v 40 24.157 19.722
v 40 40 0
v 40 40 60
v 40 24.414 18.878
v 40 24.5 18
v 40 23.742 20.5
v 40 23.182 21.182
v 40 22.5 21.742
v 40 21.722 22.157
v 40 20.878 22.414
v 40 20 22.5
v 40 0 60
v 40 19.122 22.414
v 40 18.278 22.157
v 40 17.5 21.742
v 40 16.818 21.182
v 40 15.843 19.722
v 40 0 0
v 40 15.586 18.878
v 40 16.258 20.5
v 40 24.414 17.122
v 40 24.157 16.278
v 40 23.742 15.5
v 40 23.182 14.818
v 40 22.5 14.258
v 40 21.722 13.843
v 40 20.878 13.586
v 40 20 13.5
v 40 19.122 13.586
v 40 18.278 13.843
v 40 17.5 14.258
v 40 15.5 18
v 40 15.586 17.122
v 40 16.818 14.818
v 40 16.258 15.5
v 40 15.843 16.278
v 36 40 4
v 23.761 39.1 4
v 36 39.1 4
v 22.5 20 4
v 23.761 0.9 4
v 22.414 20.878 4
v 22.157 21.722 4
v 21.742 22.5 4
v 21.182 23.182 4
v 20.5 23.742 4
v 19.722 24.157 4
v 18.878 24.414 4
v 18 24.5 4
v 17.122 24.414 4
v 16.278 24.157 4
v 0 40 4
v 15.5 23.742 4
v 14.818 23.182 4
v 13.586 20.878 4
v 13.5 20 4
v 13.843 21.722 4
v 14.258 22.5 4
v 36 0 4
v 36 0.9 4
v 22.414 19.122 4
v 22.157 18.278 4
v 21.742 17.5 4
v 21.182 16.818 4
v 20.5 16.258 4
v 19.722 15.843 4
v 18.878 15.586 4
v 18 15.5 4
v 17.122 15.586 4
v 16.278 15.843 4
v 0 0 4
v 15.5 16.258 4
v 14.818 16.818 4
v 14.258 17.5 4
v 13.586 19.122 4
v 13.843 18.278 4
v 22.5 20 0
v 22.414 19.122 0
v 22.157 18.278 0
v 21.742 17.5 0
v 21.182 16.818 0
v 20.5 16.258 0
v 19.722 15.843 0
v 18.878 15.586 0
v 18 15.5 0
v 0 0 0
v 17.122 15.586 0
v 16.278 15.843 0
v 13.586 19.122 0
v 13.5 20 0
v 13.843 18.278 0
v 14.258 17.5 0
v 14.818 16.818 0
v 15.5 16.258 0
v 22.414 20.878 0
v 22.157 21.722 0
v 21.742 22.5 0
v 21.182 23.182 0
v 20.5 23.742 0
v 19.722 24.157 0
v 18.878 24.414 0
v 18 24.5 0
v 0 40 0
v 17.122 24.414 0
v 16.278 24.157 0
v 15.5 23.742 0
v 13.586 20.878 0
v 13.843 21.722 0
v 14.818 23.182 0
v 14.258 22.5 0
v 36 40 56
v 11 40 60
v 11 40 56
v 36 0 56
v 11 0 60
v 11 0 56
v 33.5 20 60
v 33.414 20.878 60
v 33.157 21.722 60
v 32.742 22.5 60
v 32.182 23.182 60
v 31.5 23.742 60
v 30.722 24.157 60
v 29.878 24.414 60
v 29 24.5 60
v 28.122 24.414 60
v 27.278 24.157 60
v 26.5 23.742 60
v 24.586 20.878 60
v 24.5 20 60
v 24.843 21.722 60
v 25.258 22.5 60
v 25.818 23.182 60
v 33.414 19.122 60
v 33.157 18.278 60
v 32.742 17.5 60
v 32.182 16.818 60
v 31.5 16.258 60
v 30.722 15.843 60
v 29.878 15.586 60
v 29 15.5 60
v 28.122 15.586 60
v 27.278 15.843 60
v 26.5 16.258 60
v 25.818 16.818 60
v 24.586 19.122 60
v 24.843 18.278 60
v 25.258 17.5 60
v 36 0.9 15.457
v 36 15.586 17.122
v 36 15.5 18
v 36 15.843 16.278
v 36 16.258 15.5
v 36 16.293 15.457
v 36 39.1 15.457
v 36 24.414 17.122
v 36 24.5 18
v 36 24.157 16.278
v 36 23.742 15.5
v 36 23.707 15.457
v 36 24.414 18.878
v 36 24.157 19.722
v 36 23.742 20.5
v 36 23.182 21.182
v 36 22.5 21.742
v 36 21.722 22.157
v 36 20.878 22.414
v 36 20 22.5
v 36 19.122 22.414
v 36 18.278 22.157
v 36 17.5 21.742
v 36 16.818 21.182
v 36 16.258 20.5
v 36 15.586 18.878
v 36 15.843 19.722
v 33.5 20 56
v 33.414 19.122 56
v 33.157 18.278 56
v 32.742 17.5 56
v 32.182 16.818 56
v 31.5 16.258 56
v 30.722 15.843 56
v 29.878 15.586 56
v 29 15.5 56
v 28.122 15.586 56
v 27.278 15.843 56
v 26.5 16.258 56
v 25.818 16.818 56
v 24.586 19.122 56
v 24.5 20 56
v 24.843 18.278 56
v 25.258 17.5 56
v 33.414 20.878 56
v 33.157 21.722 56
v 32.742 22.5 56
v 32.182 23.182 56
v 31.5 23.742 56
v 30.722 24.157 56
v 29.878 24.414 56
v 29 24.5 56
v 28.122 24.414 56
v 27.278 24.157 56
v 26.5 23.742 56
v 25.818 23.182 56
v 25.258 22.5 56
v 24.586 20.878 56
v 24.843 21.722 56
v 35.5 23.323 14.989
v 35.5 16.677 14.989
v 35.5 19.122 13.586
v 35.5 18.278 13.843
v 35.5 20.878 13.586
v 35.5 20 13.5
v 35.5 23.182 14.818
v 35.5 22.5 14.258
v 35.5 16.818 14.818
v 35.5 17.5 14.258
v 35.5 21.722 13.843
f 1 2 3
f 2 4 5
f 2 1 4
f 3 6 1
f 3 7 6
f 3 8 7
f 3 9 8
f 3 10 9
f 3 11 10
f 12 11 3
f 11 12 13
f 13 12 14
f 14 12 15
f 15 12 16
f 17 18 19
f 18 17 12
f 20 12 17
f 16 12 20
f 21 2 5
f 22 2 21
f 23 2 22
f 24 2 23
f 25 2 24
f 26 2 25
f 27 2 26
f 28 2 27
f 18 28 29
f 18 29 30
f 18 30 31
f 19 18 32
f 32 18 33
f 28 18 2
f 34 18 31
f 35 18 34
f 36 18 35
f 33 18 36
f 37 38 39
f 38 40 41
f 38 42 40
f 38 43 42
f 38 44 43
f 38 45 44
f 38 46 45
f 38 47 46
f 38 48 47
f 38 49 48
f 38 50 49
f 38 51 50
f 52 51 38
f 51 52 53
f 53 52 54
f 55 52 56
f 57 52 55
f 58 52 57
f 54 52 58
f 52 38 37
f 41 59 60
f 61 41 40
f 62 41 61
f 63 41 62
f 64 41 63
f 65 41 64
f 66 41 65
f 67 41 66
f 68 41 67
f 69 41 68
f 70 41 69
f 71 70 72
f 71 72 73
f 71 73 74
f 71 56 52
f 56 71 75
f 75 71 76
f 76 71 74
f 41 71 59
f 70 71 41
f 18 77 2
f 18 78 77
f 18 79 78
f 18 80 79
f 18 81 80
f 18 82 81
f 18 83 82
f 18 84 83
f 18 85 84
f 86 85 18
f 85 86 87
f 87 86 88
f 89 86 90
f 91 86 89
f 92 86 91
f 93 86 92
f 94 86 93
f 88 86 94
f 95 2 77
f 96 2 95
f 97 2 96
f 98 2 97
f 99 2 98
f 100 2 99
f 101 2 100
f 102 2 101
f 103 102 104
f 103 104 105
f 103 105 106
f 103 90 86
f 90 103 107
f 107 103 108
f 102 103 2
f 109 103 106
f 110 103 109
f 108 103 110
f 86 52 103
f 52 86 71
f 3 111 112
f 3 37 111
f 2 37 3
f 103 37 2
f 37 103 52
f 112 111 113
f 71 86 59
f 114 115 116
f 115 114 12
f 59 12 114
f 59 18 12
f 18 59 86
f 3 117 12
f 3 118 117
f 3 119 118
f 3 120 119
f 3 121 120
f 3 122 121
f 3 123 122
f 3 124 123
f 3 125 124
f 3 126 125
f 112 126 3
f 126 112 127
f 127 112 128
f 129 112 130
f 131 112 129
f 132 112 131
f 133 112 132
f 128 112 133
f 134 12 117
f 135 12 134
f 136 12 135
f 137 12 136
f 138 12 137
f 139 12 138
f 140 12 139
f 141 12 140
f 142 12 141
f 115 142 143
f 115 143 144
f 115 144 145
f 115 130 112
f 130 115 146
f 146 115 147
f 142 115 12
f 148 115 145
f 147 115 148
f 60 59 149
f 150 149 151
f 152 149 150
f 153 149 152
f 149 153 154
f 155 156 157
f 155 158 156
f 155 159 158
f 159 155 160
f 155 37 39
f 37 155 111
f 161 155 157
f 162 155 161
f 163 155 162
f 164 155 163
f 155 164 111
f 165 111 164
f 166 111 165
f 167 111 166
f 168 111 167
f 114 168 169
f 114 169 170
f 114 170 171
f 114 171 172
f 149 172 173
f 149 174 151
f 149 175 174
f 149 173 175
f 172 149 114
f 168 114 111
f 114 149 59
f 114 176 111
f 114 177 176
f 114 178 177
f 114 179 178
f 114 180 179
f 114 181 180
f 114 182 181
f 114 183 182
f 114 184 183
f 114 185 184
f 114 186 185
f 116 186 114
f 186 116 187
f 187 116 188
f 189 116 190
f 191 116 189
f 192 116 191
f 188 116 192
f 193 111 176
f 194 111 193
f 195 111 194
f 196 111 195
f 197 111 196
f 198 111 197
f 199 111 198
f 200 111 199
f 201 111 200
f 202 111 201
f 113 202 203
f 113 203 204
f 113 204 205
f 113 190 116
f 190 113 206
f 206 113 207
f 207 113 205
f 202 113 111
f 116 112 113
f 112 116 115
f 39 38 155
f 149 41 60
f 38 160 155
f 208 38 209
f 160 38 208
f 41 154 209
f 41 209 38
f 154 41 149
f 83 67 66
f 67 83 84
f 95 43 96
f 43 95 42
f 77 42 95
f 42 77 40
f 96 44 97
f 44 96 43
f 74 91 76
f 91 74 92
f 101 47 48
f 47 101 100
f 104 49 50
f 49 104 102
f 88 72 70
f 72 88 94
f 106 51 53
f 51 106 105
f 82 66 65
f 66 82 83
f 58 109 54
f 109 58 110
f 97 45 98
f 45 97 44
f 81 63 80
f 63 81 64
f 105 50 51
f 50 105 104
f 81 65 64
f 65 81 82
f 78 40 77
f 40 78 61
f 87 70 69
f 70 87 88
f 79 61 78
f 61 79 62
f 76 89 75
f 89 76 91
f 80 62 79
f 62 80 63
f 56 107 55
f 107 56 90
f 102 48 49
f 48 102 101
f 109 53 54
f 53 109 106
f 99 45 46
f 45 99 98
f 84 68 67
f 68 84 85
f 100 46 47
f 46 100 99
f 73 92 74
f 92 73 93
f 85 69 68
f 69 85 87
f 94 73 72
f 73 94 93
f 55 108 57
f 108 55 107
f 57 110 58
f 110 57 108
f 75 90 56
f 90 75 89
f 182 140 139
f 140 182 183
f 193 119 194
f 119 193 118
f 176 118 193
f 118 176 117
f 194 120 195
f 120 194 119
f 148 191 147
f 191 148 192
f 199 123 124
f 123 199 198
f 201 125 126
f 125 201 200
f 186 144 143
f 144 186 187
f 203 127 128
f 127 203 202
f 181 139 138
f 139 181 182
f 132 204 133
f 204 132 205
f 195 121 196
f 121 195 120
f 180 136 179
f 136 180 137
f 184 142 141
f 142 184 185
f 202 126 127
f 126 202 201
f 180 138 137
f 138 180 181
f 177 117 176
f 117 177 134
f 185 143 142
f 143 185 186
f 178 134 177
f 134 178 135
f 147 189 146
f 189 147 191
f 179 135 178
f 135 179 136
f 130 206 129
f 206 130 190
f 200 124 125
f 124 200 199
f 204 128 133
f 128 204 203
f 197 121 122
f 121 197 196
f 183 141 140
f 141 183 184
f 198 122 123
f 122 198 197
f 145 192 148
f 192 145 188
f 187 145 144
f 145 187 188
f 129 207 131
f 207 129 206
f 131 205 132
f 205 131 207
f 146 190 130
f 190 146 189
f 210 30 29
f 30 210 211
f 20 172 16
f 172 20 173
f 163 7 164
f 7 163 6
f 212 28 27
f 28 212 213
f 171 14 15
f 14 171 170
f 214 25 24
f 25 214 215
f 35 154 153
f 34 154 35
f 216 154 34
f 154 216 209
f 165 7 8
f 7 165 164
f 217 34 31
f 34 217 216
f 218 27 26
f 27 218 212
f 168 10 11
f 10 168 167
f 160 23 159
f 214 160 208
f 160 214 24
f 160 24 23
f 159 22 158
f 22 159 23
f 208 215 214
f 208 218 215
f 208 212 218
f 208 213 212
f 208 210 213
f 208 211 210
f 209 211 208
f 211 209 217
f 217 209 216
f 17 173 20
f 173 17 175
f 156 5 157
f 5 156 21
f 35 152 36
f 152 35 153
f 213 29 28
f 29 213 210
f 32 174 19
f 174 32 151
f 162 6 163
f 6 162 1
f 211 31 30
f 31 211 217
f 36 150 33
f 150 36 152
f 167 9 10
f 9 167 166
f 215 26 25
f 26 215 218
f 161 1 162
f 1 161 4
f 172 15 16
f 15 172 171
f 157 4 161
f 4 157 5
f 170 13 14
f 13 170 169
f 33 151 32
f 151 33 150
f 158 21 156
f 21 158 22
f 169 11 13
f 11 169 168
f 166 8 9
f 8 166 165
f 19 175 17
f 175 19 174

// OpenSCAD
$fn = 32;

// ----------------------------------------------------------------------
// Z-bracket: 40 x 40 x 60 mm
// ----------------------------------------------------------------------

// --- parameters (mm) ---
lower_len = 40;           // lower foot length, X
upper_len = 25;           // upper foot length, X
width = 40;               // bracket width, Y
rise = 60;                // overall rise, Z
thick = 4;                // plate thickness
hole_d = 9;               // clearance for M8
rib_len = 13.2;           // gusset leg
rib_sink = 0.9;           // gusset overlap into the plates

module hole_z(px, py, z0) {
  translate([px, py, z0 - 0.5]) cylinder(h = thick + 1, d = hole_d);
}
module hole_x(py, pz) {
  translate([-0.5, py, pz]) rotate([0, 90, 0]) cylinder(h = thick + 1, d = hole_d);
}
module gusset(x0) {
  translate([x0, width - rib_sink, 0])
    rotate([90, 0, 0])
      linear_extrude(height = width - 2 * rib_sink)
        polygon(points = [[rib_sink, thick - rib_sink],
                          [rib_sink, thick - rib_sink + rib_len],
                          [-rib_len, thick - rib_sink]]);
}

difference() {
  union() {
    cube([lower_len, width, thick]);
    /* web, overlapping the lower foot */
    translate([lower_len - thick, 0, 0]) cube([thick, width, rise]);
    /* upper foot, sunk into the web */
    translate([lower_len - thick - upper_len, 0, rise - thick]) cube([upper_len + thick, width, thick]);
    gusset(lower_len - thick);
  }
  hole_z(18, 20, 0);
  translate([lower_len - thick - 7, 0, 0]) hole_z(0, 20, rise - thick);
  translate([lower_len - thick, 0, 0]) hole_x(20, 18);
}
